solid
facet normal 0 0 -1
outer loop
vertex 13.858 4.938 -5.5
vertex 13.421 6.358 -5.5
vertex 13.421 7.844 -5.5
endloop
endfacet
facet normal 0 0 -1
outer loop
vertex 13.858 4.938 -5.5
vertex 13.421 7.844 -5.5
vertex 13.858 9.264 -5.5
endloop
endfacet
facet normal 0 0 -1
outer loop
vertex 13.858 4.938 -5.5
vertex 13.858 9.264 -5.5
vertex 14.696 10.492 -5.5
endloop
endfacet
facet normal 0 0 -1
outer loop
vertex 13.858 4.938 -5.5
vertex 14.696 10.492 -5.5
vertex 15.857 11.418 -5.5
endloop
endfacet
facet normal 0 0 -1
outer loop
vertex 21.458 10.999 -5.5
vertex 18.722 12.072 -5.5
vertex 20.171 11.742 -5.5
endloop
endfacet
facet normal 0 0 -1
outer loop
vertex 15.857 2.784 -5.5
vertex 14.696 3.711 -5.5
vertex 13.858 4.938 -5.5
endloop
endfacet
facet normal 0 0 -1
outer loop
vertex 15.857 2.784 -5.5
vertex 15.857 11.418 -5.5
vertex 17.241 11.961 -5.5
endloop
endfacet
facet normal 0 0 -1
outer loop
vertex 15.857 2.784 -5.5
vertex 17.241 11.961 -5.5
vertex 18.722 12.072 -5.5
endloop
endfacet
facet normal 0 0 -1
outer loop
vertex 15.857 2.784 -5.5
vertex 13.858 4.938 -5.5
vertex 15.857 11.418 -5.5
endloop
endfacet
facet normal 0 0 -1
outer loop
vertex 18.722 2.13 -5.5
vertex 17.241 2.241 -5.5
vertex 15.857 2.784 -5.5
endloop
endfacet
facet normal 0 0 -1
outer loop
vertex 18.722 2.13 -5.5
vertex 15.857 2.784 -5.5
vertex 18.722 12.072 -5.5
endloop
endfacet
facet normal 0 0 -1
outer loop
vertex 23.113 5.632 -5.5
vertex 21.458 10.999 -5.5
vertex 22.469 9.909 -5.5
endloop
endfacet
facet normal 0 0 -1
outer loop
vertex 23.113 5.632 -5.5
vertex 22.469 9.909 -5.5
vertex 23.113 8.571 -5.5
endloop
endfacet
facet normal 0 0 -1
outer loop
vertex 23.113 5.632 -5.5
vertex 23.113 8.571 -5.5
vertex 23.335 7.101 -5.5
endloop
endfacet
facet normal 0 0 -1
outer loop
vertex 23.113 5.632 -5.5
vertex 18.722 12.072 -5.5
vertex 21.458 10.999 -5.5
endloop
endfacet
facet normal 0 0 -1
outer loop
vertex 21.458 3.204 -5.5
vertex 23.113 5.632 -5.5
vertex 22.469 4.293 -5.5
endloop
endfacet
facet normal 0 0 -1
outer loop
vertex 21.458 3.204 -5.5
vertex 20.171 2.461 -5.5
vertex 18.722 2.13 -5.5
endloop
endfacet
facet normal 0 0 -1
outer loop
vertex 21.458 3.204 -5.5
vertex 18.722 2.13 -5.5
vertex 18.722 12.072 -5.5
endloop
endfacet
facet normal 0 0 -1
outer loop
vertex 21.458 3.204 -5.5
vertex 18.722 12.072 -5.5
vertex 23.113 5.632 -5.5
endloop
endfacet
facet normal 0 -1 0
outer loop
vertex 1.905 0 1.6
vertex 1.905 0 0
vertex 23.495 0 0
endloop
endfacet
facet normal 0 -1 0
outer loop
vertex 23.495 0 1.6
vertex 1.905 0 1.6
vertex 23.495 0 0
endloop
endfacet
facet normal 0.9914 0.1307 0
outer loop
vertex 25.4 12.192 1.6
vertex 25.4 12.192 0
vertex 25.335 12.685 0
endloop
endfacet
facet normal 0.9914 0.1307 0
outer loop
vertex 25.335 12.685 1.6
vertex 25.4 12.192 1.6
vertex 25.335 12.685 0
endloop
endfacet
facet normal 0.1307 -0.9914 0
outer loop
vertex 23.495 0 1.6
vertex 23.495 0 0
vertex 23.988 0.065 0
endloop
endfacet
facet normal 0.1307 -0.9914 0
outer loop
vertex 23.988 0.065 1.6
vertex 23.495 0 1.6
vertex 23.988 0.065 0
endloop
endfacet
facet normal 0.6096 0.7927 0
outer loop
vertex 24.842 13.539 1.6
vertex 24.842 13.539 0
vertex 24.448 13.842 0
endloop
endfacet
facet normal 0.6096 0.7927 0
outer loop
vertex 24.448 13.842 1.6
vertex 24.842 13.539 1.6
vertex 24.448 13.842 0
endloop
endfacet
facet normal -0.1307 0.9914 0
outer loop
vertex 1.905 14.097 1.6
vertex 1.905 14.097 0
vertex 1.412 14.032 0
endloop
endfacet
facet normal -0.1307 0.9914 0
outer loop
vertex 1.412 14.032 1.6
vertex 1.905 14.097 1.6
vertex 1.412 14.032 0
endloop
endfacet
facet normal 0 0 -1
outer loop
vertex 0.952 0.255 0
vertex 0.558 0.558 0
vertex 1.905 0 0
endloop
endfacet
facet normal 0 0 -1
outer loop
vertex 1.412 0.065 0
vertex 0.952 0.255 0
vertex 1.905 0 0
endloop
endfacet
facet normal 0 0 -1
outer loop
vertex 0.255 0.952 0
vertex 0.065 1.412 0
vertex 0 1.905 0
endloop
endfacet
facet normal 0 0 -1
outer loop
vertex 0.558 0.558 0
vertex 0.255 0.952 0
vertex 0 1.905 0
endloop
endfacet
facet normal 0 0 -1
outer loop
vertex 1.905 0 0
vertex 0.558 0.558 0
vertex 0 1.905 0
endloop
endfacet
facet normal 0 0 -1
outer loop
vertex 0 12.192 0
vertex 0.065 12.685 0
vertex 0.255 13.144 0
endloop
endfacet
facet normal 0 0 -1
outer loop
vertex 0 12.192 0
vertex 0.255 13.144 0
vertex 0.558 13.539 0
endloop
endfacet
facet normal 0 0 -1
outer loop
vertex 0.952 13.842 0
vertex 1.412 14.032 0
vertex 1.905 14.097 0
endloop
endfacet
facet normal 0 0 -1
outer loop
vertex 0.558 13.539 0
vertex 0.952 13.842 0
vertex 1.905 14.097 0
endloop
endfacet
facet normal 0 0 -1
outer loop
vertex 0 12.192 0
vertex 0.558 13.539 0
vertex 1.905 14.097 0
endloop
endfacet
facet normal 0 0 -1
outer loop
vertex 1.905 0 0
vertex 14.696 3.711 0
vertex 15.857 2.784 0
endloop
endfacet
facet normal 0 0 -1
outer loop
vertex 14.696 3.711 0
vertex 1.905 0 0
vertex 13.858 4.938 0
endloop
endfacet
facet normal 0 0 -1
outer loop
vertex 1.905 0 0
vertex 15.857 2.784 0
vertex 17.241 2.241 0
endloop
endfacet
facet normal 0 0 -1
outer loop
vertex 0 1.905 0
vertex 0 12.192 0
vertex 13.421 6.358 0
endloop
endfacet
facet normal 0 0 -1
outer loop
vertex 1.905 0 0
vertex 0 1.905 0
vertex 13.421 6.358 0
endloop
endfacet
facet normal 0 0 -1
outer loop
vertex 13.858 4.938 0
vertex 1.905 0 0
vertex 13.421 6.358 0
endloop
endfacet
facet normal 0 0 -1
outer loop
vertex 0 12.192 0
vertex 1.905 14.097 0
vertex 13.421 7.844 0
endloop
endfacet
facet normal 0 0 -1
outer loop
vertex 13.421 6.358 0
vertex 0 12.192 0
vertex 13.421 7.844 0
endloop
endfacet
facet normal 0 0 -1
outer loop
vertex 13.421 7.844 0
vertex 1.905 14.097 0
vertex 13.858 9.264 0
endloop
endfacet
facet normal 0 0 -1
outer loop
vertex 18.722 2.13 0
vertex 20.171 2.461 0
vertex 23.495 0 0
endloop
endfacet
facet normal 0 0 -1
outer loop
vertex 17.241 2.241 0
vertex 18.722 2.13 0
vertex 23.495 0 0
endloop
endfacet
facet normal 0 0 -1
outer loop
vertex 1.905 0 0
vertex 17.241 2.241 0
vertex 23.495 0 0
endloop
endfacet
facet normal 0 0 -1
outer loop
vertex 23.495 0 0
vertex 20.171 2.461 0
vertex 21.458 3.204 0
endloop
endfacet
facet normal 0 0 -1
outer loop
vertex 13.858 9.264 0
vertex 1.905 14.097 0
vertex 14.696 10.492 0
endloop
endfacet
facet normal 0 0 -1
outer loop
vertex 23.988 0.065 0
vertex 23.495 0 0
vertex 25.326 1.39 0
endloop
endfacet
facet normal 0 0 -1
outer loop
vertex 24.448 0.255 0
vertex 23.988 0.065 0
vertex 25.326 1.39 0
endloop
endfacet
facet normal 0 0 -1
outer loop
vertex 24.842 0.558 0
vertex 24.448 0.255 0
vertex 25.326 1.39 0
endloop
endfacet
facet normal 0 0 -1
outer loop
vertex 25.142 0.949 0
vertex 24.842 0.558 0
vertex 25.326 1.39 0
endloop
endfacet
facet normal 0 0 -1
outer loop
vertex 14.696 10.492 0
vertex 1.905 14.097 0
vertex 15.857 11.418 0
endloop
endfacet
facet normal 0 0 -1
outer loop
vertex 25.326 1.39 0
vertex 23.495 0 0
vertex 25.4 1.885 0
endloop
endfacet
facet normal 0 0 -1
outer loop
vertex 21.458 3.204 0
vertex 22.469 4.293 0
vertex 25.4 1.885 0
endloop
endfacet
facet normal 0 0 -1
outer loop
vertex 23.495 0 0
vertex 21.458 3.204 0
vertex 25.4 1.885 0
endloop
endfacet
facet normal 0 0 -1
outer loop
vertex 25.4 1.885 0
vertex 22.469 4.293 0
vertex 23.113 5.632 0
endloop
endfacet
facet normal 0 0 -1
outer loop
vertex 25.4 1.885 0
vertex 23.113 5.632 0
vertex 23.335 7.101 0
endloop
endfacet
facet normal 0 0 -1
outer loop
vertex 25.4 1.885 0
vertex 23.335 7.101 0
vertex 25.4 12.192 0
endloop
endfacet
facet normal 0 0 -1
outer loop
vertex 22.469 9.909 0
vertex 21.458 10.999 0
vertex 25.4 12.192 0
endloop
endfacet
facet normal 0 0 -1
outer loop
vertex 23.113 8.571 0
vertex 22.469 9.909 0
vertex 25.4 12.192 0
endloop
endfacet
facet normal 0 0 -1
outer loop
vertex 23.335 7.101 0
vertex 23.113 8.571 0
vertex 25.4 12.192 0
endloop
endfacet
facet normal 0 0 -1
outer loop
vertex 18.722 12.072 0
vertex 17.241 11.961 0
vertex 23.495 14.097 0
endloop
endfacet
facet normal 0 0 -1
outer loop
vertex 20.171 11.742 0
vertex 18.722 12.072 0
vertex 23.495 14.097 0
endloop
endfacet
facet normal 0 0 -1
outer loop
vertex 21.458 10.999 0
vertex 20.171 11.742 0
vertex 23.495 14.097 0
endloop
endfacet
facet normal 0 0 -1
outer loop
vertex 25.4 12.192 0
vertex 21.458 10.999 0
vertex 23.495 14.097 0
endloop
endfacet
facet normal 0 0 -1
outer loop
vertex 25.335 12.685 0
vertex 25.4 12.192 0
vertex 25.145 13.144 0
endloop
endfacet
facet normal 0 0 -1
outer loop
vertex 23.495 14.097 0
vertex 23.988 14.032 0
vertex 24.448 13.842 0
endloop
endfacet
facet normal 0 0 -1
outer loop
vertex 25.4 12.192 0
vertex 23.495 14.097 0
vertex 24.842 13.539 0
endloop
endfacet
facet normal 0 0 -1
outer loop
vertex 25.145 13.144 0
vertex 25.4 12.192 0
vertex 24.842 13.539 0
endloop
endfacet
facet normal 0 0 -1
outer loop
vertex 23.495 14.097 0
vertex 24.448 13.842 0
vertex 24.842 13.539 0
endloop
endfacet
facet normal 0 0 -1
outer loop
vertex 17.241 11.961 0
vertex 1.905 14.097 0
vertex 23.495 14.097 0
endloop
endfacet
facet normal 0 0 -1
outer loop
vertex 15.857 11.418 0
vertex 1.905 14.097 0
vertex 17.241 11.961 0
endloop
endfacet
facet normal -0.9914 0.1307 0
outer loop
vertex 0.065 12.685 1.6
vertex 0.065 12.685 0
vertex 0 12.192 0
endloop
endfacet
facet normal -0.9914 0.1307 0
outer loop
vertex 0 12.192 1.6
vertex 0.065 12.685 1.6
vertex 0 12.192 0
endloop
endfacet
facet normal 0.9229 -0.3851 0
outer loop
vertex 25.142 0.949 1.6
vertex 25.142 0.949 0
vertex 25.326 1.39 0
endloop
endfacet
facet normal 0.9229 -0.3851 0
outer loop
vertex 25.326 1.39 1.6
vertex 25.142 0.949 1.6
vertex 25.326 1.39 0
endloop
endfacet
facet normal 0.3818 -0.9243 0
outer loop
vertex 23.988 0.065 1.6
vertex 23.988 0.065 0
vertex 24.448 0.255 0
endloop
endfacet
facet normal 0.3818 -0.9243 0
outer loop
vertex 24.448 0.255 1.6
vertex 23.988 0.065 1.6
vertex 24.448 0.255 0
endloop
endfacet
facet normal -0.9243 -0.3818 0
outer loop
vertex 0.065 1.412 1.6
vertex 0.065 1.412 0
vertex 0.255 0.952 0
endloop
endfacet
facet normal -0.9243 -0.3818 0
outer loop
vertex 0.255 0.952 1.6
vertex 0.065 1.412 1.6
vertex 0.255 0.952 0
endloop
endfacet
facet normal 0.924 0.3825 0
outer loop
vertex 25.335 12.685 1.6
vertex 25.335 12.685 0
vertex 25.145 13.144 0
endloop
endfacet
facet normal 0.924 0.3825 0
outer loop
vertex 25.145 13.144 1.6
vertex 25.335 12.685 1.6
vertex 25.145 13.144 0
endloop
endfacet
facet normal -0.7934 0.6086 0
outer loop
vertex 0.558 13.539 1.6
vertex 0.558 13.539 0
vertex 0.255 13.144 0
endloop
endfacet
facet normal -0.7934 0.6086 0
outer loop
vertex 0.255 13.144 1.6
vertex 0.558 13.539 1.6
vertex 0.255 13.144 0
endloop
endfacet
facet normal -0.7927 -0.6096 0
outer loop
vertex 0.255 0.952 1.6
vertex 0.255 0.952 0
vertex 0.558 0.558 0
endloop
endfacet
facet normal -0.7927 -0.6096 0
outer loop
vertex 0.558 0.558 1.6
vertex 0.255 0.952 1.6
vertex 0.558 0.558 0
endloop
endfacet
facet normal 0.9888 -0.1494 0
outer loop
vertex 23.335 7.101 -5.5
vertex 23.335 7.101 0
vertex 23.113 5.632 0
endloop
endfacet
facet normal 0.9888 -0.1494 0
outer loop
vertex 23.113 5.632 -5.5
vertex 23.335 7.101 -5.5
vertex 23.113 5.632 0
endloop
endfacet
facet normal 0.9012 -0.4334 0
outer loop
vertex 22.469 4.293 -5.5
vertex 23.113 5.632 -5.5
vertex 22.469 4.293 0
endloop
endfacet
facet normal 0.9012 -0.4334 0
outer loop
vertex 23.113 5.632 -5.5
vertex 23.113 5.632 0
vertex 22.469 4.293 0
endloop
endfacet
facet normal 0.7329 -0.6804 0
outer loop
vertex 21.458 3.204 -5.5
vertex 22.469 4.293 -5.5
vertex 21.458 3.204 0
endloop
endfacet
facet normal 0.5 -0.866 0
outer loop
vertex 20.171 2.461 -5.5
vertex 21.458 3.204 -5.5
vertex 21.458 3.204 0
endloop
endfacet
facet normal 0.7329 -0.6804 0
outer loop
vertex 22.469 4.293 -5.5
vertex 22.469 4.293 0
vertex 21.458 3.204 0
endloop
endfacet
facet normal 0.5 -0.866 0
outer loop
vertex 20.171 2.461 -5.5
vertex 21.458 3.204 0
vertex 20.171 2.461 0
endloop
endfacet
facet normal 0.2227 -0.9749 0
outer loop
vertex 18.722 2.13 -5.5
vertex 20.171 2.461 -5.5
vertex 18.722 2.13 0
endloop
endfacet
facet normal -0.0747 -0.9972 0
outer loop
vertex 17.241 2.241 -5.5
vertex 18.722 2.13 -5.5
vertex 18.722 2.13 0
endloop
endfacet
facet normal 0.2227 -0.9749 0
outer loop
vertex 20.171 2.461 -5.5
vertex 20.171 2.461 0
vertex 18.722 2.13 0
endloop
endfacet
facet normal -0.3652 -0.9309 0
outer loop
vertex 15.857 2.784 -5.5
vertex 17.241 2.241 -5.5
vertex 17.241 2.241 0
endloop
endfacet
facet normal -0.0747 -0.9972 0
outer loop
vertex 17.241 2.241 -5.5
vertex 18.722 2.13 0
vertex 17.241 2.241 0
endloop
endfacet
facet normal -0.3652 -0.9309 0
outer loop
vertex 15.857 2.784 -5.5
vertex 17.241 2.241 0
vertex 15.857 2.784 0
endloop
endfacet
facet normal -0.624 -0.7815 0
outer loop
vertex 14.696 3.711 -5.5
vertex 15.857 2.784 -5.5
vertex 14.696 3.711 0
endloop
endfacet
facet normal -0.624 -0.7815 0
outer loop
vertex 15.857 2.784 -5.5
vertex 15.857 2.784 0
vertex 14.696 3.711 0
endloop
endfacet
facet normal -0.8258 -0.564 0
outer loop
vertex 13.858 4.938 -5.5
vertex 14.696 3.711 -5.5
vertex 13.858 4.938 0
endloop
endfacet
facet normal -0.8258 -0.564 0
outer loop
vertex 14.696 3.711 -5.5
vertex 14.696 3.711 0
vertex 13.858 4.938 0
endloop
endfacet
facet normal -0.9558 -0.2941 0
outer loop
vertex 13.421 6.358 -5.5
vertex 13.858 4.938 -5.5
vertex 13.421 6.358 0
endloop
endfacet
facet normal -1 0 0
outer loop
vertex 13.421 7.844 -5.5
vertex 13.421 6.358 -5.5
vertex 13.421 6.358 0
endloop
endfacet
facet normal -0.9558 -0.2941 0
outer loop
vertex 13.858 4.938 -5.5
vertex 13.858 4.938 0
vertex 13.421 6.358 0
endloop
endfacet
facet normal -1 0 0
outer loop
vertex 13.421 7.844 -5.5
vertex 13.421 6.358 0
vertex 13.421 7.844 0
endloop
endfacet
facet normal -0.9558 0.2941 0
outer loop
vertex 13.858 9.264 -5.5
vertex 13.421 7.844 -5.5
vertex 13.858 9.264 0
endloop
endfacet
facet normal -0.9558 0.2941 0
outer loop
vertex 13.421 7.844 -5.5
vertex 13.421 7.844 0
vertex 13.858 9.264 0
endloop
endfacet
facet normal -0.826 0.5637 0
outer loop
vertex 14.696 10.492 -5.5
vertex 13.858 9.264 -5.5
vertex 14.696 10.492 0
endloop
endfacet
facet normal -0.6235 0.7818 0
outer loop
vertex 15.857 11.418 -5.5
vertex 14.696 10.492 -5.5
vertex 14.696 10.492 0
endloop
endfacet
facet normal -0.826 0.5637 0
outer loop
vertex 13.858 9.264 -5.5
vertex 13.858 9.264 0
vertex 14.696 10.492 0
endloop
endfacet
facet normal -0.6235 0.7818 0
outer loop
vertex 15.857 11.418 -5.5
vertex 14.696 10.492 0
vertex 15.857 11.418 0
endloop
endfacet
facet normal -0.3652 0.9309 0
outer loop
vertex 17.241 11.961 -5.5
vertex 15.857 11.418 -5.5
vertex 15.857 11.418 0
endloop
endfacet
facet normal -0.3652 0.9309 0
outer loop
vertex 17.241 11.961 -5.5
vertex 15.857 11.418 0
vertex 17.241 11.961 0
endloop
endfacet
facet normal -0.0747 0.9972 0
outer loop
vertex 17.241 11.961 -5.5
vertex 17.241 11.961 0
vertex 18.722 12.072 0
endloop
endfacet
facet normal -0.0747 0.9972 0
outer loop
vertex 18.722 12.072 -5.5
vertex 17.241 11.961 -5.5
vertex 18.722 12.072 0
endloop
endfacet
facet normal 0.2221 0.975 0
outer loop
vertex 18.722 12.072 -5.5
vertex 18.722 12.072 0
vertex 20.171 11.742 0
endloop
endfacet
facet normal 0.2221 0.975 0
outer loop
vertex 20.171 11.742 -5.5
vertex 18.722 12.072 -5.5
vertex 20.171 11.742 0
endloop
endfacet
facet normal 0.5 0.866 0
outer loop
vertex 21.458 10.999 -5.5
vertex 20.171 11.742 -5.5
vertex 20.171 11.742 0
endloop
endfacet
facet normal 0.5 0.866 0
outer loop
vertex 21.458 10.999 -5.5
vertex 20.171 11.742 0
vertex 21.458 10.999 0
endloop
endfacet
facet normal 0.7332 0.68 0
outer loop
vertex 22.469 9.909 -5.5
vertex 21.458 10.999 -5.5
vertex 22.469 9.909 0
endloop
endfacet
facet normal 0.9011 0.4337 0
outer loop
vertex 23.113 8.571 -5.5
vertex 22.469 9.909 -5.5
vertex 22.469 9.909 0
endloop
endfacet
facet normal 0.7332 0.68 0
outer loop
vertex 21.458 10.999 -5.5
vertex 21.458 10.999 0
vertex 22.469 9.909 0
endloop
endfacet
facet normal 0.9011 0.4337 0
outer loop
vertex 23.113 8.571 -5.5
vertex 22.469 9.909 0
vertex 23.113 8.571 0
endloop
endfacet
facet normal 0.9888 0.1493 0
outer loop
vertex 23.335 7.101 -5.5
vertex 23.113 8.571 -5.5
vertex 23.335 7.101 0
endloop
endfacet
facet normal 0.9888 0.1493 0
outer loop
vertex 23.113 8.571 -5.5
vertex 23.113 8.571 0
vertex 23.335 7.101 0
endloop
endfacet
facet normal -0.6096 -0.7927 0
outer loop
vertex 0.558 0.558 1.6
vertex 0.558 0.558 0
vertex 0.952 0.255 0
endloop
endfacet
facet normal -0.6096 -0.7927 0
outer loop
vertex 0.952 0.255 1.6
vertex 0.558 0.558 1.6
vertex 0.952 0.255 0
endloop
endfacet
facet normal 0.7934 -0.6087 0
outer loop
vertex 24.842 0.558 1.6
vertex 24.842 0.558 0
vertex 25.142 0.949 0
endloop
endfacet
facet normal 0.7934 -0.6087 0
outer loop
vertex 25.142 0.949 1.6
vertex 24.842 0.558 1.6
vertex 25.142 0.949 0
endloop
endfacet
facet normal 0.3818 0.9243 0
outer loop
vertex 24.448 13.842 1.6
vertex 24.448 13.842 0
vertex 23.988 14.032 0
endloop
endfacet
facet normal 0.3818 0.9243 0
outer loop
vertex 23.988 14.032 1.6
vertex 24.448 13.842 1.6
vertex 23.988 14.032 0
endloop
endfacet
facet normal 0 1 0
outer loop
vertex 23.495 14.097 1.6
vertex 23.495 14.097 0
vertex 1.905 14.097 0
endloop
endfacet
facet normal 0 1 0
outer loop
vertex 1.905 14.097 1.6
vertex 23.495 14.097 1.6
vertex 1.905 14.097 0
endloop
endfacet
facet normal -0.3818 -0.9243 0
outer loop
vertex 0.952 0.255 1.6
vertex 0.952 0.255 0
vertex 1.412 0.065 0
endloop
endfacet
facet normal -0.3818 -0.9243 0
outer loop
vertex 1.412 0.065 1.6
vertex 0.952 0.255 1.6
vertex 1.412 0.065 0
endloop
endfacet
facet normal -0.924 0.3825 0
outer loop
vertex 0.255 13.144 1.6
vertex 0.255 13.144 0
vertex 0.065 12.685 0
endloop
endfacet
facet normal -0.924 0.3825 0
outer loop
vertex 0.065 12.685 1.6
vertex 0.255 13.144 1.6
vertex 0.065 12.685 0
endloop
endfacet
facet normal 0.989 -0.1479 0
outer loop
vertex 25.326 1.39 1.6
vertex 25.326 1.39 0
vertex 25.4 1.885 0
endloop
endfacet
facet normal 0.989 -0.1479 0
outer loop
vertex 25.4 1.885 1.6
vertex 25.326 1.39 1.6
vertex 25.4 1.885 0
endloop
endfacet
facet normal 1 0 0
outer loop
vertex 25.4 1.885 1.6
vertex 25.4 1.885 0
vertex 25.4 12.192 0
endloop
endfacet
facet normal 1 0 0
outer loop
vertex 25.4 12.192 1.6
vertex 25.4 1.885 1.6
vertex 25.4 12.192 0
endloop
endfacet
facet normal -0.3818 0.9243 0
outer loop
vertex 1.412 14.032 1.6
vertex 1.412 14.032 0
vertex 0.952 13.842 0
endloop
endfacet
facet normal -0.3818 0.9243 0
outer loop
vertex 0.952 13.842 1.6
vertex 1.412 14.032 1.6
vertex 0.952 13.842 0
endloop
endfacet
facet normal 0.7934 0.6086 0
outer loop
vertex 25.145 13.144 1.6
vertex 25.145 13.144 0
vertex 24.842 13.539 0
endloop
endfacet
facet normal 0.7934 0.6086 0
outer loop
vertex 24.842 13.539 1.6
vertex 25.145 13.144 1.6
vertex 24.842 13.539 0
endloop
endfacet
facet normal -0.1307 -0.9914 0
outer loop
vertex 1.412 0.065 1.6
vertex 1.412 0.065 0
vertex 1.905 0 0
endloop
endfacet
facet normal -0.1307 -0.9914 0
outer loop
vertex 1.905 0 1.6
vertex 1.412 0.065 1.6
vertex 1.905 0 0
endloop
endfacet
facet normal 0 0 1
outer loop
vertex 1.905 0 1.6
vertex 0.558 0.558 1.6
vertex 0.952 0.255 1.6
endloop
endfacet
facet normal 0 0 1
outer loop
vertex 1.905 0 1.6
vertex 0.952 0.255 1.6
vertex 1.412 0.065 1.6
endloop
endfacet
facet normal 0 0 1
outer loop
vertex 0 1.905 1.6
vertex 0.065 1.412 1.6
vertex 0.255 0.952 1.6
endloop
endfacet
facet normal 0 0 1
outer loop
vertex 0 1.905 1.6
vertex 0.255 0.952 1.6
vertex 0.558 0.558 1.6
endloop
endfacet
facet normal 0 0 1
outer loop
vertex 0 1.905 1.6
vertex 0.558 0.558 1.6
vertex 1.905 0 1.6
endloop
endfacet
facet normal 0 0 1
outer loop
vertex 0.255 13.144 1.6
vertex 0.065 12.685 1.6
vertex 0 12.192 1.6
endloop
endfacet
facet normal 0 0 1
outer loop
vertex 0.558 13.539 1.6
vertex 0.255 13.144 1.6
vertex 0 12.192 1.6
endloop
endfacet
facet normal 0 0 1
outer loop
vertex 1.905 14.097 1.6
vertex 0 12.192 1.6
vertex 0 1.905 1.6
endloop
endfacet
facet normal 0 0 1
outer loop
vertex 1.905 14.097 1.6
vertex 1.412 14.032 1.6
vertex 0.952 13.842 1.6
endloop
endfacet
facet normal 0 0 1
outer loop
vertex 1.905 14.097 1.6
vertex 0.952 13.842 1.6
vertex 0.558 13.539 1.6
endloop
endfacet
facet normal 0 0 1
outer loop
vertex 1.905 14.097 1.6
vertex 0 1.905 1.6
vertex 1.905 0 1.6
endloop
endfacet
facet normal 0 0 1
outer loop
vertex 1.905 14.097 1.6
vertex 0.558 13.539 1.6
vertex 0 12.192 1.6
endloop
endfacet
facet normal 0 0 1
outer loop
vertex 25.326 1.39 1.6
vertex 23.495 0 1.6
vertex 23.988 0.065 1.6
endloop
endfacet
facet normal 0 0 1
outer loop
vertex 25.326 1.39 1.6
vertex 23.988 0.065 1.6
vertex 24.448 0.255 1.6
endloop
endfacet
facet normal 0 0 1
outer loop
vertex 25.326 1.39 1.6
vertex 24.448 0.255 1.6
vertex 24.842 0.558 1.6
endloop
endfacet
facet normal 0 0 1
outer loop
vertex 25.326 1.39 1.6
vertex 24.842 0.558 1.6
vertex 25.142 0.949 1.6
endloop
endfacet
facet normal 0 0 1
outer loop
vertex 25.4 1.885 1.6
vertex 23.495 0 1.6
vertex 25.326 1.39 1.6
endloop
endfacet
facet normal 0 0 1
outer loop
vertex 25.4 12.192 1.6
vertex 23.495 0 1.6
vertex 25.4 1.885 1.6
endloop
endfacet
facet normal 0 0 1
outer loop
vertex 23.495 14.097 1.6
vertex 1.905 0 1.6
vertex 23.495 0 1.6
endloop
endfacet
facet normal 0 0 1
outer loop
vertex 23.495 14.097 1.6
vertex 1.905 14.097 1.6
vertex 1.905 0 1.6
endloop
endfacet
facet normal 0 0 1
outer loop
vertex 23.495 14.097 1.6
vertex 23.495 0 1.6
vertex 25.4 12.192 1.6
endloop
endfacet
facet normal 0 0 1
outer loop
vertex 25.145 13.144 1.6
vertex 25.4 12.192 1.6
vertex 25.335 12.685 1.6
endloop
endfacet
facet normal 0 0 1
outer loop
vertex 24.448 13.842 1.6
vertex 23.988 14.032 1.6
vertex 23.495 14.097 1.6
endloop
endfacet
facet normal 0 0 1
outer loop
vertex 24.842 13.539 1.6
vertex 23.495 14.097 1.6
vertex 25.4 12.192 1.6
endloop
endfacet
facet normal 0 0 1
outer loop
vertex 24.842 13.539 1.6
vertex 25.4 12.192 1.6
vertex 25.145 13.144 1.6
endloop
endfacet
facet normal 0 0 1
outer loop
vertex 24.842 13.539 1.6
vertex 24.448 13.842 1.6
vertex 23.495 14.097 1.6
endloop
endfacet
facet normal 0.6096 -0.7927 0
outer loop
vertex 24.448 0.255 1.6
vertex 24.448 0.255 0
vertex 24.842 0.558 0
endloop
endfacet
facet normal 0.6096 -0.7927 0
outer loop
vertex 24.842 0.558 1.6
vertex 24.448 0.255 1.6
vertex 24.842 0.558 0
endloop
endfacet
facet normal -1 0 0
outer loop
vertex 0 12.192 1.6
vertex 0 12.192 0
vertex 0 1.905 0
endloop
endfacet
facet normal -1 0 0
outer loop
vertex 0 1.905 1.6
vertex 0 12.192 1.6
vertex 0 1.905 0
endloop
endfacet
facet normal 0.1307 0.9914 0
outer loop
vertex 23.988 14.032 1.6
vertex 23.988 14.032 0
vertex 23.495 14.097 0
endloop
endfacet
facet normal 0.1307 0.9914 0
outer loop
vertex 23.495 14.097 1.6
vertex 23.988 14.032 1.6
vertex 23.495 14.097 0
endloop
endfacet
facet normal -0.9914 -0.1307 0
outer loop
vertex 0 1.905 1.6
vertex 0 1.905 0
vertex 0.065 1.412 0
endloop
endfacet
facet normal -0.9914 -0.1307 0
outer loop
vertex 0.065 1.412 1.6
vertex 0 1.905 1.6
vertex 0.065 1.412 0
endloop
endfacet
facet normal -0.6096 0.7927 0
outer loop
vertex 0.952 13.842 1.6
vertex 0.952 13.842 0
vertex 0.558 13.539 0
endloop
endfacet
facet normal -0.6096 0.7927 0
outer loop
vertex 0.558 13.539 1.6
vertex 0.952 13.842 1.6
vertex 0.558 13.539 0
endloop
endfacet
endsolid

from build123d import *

# Parameters (mm, degrees)
BOSS_EXTRUDE1_DEPTH = 1.6
SKETCH1_R           = 4.985014332
BOSS_EXTRUDE2_DEPTH = 5.5


with BuildPart() as part:
    # Board_Outline → Boss-Extrude1 (new body)
    with BuildSketch(Plane.XY):
        Polygon((0, 12.192), (0, 1.905), (0.064911, 1.41195), (0.255222, 0.9525), (0.557962, 0.557962), (0.9525, 0.255222), (1.41195, 0.064911), (1.905, 0), (23.495, 0), (23.98805, 0.064911), (24.4475, 0.255222), (24.842038, 0.557962), (25.142046405, 0.948978179), (25.325809203, 1.389546655), (25.4, 1.884780797), (25.4, 1.905), (25.4, 12.192), (25.335089, 12.68505), (25.144778, 13.1445), (24.842038, 13.539038), (24.4475, 13.841778), (23.98805, 14.032089), (23.495, 14.097), (1.905, 14.097), (1.41195, 14.032089), (0.9525, 13.841778), (0.557962, 13.539038), (0.255222, 13.1445), (0.064911, 12.68505), align=None)
    extrude(amount=BOSS_EXTRUDE1_DEPTH)

    # Sketch1 → Boss-Extrude2 (add)
    with BuildSketch(Plane(origin=(0, 0, 0), x_dir=(-1, 0, 0), z_dir=(0, 0, -1))):
        with Locations(Location((-18.349836539, 7.101234384, 0), (0, 0, 180))):
            Circle(SKETCH1_R)
    extrude(amount=BOSS_EXTRUDE2_DEPTH)


solid = part.part
